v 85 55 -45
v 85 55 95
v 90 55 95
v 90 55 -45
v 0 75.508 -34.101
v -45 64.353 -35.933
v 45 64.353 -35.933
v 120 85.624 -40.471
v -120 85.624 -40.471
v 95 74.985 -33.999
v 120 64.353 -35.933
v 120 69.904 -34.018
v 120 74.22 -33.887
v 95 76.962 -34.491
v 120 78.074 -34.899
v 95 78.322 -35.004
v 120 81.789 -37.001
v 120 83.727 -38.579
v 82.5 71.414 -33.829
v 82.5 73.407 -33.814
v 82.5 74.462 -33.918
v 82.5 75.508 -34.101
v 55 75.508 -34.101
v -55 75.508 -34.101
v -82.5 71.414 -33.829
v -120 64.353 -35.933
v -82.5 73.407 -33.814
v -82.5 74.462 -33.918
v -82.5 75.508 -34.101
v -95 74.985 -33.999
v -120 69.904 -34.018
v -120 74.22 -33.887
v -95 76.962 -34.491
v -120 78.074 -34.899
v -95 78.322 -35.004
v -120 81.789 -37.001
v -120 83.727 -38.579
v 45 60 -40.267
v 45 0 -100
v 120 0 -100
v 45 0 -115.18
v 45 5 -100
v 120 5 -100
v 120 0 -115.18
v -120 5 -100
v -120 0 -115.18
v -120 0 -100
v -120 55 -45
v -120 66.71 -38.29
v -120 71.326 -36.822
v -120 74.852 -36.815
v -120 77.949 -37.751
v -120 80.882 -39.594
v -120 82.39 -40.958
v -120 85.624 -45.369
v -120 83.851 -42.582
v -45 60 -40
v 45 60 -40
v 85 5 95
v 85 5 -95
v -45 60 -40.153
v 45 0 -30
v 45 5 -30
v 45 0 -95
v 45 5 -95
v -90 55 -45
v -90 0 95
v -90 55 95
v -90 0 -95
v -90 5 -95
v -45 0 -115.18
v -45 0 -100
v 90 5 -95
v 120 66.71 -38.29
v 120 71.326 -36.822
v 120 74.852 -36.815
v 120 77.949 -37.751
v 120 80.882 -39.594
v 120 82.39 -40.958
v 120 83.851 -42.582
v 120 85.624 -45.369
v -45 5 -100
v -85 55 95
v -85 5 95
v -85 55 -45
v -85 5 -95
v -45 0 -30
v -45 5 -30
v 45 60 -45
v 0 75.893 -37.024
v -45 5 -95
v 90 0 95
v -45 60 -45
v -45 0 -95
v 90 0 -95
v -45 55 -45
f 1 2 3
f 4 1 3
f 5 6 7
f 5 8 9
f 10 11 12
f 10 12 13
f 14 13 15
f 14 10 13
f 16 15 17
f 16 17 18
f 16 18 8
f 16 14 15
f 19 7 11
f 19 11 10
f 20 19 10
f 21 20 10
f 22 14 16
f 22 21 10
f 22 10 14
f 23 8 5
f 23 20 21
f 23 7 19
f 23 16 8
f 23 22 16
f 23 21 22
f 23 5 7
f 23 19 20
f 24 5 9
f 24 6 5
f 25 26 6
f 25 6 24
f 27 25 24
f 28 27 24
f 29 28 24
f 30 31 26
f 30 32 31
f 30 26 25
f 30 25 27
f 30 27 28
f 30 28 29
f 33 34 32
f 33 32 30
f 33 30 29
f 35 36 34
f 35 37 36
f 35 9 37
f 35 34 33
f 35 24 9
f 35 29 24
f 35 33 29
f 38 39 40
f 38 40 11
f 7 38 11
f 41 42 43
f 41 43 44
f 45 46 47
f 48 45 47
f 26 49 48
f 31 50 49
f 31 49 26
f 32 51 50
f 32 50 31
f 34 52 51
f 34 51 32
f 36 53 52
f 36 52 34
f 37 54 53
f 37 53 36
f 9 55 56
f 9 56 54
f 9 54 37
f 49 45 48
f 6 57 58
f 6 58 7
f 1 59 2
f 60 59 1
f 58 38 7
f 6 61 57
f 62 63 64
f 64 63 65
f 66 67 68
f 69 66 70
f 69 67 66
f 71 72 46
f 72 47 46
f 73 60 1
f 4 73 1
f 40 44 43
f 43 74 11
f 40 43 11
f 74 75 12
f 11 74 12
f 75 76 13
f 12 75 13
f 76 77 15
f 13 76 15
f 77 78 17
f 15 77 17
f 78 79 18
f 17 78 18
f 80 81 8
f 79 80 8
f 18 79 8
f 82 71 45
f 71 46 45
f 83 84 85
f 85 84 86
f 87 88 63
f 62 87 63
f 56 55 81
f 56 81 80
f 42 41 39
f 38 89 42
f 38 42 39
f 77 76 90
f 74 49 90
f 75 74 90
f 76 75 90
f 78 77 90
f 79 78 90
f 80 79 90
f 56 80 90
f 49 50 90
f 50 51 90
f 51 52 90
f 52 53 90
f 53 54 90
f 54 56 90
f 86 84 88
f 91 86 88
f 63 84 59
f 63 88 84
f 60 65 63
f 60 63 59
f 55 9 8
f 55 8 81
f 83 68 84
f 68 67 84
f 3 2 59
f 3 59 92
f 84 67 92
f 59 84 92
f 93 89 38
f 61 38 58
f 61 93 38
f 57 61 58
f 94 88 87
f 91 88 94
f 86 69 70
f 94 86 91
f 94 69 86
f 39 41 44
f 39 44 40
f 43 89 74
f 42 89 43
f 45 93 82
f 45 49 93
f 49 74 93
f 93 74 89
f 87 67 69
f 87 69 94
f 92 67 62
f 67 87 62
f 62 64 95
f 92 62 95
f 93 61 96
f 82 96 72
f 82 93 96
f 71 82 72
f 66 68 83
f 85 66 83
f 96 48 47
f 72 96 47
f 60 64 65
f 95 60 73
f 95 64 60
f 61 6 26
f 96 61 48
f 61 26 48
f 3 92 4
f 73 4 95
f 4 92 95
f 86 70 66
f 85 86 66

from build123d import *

# Parameters (mm, degrees)
SKETCH2_W                = 180
SKETCH2_H                = 190
BOSS_EXTRUDE3_DEPTH      = 5
SKETCH4_W                = 5
SKETCH4_H                = 190
BOSS_EXTRUDE4_DEPTH      = 50
CUT_EXTRUDE1_DEPTH       = 213
BOSS_EXTRUDE8_DEPTH      = 30
BOSS_EXTRUDE8_DEPTH_BACK = 45
SKETCH8_W                = 90
SKETCH8_H                = 65
CUT_EXTRUDE2_DEPTH       = 213
BOSS_EXTRUDE9_DEPTH      = 90
BOSS_EXTRUDE10_DEPTH     = 75
BOSS_EXTRUDE11_DEPTH     = 240


with BuildPart() as part:
    # Sketch2 → Boss-Extrude3 (new body)
    with BuildSketch(Plane(origin=(0, 0, 0), x_dir=(1, 0, 0), z_dir=(0, 1, 0))):
        Rectangle(SKETCH2_W, SKETCH2_H)
    extrude(amount=BOSS_EXTRUDE3_DEPTH)

    # Sketch4 → Boss-Extrude4 (add)
    with BuildSketch(Plane(origin=(0, 5, 0), x_dir=(1, 0, 0), z_dir=(0, 1, 0))):
        with Locations((-87.5, 0)):
            Rectangle(SKETCH4_W, SKETCH4_H)
        with Locations((87.5, 0)):
            Rectangle(SKETCH4_W, SKETCH4_H)
    extrude(amount=BOSS_EXTRUDE4_DEPTH)

    # Sketch5 → Cut-Extrude1 (cut)
    with BuildSketch(Plane.ZY.offset(90)):
        Polygon((-95, 5), (-45, 55), (-95, 55), align=None)
    extrude(amount=-CUT_EXTRUDE1_DEPTH, mode=Mode.SUBTRACT)

    # Sketch8 → Cut-Extrude2 (cut)
    with BuildSketch(Plane(origin=(0, 5, 0), x_dir=(1, 0, 0), z_dir=(0, 1, 0))):
        with Locations((0, 62.5)):
            Rectangle(SKETCH8_W, SKETCH8_H)
    extrude(amount=-CUT_EXTRUDE2_DEPTH, mode=Mode.SUBTRACT)


with BuildPart() as body_2:
    # Sketch6 → Boss-Extrude8 (new body, two sides)
    with BuildSketch(Plane.ZY.offset(90)) as boss_extrude8_sk:
        Polygon((-45, 55), (-100, 0), (-115.179593987, 0), (-100, 5), (-38.289752249, 66.710247751), (-35.932935024, 64.353430526), align=None)
    extrude(amount=BOSS_EXTRUDE8_DEPTH)
    extrude(boss_extrude8_sk.sketch, amount=-BOSS_EXTRUDE8_DEPTH_BACK)

    # Sketch9 → Boss-Extrude9 (add)
    with BuildSketch(Plane(origin=(-45, 0, 0), x_dir=(0, 0, -1), z_dir=(1, 0, 0))):
        Polygon((38.289752249, 66.710247751), (45, 60), (40, 60), (35.932935024, 64.353430526), align=None)
    extrude(amount=BOSS_EXTRUDE9_DEPTH)

    # Sketch10 → Boss-Extrude10 (add)
    with BuildSketch(Plane(origin=(45, 0, 0), x_dir=(0, 0, -1), z_dir=(1, 0, 0))):
        Polygon((38.289752249, 66.710247751), (100, 5), (115.179593987, 0), (100, 0), (35.932935024, 64.353430526), align=None)
    extrude(amount=BOSS_EXTRUDE10_DEPTH)

    # Sketch11 → Boss-Extrude11 (add)
    with BuildSketch(Plane.ZY.offset(120)):
        with BuildLine():
            Line((-40.470794509, 85.624473581), (-45.36880954, 85.624473581))
            Line((-45.36880954, 85.624473581), (-42.582007885, 83.851054345))
            add(Edge.make_bspline(
                [(-38.289752249, 66.710247751), (-33.612321087, 76.504663432), (-42.582007885, 83.851054345)],
                knots=[0, 0, 0, 1, 1, 1], degree=2))
            Line((-38.289752249, 66.710247751), (-35.932935024, 64.353430526))
            add(Edge.make_bspline(
                [(-35.932935024, 64.353430526), (-29.999618337, 76.026824974), (-40.470794509, 85.624473581)],
                knots=[0, 0, 0, 1, 1, 1], degree=2))
        make_face()
    extrude(amount=-BOSS_EXTRUDE11_DEPTH)


solid = Compound([part.part, body_2.part])
